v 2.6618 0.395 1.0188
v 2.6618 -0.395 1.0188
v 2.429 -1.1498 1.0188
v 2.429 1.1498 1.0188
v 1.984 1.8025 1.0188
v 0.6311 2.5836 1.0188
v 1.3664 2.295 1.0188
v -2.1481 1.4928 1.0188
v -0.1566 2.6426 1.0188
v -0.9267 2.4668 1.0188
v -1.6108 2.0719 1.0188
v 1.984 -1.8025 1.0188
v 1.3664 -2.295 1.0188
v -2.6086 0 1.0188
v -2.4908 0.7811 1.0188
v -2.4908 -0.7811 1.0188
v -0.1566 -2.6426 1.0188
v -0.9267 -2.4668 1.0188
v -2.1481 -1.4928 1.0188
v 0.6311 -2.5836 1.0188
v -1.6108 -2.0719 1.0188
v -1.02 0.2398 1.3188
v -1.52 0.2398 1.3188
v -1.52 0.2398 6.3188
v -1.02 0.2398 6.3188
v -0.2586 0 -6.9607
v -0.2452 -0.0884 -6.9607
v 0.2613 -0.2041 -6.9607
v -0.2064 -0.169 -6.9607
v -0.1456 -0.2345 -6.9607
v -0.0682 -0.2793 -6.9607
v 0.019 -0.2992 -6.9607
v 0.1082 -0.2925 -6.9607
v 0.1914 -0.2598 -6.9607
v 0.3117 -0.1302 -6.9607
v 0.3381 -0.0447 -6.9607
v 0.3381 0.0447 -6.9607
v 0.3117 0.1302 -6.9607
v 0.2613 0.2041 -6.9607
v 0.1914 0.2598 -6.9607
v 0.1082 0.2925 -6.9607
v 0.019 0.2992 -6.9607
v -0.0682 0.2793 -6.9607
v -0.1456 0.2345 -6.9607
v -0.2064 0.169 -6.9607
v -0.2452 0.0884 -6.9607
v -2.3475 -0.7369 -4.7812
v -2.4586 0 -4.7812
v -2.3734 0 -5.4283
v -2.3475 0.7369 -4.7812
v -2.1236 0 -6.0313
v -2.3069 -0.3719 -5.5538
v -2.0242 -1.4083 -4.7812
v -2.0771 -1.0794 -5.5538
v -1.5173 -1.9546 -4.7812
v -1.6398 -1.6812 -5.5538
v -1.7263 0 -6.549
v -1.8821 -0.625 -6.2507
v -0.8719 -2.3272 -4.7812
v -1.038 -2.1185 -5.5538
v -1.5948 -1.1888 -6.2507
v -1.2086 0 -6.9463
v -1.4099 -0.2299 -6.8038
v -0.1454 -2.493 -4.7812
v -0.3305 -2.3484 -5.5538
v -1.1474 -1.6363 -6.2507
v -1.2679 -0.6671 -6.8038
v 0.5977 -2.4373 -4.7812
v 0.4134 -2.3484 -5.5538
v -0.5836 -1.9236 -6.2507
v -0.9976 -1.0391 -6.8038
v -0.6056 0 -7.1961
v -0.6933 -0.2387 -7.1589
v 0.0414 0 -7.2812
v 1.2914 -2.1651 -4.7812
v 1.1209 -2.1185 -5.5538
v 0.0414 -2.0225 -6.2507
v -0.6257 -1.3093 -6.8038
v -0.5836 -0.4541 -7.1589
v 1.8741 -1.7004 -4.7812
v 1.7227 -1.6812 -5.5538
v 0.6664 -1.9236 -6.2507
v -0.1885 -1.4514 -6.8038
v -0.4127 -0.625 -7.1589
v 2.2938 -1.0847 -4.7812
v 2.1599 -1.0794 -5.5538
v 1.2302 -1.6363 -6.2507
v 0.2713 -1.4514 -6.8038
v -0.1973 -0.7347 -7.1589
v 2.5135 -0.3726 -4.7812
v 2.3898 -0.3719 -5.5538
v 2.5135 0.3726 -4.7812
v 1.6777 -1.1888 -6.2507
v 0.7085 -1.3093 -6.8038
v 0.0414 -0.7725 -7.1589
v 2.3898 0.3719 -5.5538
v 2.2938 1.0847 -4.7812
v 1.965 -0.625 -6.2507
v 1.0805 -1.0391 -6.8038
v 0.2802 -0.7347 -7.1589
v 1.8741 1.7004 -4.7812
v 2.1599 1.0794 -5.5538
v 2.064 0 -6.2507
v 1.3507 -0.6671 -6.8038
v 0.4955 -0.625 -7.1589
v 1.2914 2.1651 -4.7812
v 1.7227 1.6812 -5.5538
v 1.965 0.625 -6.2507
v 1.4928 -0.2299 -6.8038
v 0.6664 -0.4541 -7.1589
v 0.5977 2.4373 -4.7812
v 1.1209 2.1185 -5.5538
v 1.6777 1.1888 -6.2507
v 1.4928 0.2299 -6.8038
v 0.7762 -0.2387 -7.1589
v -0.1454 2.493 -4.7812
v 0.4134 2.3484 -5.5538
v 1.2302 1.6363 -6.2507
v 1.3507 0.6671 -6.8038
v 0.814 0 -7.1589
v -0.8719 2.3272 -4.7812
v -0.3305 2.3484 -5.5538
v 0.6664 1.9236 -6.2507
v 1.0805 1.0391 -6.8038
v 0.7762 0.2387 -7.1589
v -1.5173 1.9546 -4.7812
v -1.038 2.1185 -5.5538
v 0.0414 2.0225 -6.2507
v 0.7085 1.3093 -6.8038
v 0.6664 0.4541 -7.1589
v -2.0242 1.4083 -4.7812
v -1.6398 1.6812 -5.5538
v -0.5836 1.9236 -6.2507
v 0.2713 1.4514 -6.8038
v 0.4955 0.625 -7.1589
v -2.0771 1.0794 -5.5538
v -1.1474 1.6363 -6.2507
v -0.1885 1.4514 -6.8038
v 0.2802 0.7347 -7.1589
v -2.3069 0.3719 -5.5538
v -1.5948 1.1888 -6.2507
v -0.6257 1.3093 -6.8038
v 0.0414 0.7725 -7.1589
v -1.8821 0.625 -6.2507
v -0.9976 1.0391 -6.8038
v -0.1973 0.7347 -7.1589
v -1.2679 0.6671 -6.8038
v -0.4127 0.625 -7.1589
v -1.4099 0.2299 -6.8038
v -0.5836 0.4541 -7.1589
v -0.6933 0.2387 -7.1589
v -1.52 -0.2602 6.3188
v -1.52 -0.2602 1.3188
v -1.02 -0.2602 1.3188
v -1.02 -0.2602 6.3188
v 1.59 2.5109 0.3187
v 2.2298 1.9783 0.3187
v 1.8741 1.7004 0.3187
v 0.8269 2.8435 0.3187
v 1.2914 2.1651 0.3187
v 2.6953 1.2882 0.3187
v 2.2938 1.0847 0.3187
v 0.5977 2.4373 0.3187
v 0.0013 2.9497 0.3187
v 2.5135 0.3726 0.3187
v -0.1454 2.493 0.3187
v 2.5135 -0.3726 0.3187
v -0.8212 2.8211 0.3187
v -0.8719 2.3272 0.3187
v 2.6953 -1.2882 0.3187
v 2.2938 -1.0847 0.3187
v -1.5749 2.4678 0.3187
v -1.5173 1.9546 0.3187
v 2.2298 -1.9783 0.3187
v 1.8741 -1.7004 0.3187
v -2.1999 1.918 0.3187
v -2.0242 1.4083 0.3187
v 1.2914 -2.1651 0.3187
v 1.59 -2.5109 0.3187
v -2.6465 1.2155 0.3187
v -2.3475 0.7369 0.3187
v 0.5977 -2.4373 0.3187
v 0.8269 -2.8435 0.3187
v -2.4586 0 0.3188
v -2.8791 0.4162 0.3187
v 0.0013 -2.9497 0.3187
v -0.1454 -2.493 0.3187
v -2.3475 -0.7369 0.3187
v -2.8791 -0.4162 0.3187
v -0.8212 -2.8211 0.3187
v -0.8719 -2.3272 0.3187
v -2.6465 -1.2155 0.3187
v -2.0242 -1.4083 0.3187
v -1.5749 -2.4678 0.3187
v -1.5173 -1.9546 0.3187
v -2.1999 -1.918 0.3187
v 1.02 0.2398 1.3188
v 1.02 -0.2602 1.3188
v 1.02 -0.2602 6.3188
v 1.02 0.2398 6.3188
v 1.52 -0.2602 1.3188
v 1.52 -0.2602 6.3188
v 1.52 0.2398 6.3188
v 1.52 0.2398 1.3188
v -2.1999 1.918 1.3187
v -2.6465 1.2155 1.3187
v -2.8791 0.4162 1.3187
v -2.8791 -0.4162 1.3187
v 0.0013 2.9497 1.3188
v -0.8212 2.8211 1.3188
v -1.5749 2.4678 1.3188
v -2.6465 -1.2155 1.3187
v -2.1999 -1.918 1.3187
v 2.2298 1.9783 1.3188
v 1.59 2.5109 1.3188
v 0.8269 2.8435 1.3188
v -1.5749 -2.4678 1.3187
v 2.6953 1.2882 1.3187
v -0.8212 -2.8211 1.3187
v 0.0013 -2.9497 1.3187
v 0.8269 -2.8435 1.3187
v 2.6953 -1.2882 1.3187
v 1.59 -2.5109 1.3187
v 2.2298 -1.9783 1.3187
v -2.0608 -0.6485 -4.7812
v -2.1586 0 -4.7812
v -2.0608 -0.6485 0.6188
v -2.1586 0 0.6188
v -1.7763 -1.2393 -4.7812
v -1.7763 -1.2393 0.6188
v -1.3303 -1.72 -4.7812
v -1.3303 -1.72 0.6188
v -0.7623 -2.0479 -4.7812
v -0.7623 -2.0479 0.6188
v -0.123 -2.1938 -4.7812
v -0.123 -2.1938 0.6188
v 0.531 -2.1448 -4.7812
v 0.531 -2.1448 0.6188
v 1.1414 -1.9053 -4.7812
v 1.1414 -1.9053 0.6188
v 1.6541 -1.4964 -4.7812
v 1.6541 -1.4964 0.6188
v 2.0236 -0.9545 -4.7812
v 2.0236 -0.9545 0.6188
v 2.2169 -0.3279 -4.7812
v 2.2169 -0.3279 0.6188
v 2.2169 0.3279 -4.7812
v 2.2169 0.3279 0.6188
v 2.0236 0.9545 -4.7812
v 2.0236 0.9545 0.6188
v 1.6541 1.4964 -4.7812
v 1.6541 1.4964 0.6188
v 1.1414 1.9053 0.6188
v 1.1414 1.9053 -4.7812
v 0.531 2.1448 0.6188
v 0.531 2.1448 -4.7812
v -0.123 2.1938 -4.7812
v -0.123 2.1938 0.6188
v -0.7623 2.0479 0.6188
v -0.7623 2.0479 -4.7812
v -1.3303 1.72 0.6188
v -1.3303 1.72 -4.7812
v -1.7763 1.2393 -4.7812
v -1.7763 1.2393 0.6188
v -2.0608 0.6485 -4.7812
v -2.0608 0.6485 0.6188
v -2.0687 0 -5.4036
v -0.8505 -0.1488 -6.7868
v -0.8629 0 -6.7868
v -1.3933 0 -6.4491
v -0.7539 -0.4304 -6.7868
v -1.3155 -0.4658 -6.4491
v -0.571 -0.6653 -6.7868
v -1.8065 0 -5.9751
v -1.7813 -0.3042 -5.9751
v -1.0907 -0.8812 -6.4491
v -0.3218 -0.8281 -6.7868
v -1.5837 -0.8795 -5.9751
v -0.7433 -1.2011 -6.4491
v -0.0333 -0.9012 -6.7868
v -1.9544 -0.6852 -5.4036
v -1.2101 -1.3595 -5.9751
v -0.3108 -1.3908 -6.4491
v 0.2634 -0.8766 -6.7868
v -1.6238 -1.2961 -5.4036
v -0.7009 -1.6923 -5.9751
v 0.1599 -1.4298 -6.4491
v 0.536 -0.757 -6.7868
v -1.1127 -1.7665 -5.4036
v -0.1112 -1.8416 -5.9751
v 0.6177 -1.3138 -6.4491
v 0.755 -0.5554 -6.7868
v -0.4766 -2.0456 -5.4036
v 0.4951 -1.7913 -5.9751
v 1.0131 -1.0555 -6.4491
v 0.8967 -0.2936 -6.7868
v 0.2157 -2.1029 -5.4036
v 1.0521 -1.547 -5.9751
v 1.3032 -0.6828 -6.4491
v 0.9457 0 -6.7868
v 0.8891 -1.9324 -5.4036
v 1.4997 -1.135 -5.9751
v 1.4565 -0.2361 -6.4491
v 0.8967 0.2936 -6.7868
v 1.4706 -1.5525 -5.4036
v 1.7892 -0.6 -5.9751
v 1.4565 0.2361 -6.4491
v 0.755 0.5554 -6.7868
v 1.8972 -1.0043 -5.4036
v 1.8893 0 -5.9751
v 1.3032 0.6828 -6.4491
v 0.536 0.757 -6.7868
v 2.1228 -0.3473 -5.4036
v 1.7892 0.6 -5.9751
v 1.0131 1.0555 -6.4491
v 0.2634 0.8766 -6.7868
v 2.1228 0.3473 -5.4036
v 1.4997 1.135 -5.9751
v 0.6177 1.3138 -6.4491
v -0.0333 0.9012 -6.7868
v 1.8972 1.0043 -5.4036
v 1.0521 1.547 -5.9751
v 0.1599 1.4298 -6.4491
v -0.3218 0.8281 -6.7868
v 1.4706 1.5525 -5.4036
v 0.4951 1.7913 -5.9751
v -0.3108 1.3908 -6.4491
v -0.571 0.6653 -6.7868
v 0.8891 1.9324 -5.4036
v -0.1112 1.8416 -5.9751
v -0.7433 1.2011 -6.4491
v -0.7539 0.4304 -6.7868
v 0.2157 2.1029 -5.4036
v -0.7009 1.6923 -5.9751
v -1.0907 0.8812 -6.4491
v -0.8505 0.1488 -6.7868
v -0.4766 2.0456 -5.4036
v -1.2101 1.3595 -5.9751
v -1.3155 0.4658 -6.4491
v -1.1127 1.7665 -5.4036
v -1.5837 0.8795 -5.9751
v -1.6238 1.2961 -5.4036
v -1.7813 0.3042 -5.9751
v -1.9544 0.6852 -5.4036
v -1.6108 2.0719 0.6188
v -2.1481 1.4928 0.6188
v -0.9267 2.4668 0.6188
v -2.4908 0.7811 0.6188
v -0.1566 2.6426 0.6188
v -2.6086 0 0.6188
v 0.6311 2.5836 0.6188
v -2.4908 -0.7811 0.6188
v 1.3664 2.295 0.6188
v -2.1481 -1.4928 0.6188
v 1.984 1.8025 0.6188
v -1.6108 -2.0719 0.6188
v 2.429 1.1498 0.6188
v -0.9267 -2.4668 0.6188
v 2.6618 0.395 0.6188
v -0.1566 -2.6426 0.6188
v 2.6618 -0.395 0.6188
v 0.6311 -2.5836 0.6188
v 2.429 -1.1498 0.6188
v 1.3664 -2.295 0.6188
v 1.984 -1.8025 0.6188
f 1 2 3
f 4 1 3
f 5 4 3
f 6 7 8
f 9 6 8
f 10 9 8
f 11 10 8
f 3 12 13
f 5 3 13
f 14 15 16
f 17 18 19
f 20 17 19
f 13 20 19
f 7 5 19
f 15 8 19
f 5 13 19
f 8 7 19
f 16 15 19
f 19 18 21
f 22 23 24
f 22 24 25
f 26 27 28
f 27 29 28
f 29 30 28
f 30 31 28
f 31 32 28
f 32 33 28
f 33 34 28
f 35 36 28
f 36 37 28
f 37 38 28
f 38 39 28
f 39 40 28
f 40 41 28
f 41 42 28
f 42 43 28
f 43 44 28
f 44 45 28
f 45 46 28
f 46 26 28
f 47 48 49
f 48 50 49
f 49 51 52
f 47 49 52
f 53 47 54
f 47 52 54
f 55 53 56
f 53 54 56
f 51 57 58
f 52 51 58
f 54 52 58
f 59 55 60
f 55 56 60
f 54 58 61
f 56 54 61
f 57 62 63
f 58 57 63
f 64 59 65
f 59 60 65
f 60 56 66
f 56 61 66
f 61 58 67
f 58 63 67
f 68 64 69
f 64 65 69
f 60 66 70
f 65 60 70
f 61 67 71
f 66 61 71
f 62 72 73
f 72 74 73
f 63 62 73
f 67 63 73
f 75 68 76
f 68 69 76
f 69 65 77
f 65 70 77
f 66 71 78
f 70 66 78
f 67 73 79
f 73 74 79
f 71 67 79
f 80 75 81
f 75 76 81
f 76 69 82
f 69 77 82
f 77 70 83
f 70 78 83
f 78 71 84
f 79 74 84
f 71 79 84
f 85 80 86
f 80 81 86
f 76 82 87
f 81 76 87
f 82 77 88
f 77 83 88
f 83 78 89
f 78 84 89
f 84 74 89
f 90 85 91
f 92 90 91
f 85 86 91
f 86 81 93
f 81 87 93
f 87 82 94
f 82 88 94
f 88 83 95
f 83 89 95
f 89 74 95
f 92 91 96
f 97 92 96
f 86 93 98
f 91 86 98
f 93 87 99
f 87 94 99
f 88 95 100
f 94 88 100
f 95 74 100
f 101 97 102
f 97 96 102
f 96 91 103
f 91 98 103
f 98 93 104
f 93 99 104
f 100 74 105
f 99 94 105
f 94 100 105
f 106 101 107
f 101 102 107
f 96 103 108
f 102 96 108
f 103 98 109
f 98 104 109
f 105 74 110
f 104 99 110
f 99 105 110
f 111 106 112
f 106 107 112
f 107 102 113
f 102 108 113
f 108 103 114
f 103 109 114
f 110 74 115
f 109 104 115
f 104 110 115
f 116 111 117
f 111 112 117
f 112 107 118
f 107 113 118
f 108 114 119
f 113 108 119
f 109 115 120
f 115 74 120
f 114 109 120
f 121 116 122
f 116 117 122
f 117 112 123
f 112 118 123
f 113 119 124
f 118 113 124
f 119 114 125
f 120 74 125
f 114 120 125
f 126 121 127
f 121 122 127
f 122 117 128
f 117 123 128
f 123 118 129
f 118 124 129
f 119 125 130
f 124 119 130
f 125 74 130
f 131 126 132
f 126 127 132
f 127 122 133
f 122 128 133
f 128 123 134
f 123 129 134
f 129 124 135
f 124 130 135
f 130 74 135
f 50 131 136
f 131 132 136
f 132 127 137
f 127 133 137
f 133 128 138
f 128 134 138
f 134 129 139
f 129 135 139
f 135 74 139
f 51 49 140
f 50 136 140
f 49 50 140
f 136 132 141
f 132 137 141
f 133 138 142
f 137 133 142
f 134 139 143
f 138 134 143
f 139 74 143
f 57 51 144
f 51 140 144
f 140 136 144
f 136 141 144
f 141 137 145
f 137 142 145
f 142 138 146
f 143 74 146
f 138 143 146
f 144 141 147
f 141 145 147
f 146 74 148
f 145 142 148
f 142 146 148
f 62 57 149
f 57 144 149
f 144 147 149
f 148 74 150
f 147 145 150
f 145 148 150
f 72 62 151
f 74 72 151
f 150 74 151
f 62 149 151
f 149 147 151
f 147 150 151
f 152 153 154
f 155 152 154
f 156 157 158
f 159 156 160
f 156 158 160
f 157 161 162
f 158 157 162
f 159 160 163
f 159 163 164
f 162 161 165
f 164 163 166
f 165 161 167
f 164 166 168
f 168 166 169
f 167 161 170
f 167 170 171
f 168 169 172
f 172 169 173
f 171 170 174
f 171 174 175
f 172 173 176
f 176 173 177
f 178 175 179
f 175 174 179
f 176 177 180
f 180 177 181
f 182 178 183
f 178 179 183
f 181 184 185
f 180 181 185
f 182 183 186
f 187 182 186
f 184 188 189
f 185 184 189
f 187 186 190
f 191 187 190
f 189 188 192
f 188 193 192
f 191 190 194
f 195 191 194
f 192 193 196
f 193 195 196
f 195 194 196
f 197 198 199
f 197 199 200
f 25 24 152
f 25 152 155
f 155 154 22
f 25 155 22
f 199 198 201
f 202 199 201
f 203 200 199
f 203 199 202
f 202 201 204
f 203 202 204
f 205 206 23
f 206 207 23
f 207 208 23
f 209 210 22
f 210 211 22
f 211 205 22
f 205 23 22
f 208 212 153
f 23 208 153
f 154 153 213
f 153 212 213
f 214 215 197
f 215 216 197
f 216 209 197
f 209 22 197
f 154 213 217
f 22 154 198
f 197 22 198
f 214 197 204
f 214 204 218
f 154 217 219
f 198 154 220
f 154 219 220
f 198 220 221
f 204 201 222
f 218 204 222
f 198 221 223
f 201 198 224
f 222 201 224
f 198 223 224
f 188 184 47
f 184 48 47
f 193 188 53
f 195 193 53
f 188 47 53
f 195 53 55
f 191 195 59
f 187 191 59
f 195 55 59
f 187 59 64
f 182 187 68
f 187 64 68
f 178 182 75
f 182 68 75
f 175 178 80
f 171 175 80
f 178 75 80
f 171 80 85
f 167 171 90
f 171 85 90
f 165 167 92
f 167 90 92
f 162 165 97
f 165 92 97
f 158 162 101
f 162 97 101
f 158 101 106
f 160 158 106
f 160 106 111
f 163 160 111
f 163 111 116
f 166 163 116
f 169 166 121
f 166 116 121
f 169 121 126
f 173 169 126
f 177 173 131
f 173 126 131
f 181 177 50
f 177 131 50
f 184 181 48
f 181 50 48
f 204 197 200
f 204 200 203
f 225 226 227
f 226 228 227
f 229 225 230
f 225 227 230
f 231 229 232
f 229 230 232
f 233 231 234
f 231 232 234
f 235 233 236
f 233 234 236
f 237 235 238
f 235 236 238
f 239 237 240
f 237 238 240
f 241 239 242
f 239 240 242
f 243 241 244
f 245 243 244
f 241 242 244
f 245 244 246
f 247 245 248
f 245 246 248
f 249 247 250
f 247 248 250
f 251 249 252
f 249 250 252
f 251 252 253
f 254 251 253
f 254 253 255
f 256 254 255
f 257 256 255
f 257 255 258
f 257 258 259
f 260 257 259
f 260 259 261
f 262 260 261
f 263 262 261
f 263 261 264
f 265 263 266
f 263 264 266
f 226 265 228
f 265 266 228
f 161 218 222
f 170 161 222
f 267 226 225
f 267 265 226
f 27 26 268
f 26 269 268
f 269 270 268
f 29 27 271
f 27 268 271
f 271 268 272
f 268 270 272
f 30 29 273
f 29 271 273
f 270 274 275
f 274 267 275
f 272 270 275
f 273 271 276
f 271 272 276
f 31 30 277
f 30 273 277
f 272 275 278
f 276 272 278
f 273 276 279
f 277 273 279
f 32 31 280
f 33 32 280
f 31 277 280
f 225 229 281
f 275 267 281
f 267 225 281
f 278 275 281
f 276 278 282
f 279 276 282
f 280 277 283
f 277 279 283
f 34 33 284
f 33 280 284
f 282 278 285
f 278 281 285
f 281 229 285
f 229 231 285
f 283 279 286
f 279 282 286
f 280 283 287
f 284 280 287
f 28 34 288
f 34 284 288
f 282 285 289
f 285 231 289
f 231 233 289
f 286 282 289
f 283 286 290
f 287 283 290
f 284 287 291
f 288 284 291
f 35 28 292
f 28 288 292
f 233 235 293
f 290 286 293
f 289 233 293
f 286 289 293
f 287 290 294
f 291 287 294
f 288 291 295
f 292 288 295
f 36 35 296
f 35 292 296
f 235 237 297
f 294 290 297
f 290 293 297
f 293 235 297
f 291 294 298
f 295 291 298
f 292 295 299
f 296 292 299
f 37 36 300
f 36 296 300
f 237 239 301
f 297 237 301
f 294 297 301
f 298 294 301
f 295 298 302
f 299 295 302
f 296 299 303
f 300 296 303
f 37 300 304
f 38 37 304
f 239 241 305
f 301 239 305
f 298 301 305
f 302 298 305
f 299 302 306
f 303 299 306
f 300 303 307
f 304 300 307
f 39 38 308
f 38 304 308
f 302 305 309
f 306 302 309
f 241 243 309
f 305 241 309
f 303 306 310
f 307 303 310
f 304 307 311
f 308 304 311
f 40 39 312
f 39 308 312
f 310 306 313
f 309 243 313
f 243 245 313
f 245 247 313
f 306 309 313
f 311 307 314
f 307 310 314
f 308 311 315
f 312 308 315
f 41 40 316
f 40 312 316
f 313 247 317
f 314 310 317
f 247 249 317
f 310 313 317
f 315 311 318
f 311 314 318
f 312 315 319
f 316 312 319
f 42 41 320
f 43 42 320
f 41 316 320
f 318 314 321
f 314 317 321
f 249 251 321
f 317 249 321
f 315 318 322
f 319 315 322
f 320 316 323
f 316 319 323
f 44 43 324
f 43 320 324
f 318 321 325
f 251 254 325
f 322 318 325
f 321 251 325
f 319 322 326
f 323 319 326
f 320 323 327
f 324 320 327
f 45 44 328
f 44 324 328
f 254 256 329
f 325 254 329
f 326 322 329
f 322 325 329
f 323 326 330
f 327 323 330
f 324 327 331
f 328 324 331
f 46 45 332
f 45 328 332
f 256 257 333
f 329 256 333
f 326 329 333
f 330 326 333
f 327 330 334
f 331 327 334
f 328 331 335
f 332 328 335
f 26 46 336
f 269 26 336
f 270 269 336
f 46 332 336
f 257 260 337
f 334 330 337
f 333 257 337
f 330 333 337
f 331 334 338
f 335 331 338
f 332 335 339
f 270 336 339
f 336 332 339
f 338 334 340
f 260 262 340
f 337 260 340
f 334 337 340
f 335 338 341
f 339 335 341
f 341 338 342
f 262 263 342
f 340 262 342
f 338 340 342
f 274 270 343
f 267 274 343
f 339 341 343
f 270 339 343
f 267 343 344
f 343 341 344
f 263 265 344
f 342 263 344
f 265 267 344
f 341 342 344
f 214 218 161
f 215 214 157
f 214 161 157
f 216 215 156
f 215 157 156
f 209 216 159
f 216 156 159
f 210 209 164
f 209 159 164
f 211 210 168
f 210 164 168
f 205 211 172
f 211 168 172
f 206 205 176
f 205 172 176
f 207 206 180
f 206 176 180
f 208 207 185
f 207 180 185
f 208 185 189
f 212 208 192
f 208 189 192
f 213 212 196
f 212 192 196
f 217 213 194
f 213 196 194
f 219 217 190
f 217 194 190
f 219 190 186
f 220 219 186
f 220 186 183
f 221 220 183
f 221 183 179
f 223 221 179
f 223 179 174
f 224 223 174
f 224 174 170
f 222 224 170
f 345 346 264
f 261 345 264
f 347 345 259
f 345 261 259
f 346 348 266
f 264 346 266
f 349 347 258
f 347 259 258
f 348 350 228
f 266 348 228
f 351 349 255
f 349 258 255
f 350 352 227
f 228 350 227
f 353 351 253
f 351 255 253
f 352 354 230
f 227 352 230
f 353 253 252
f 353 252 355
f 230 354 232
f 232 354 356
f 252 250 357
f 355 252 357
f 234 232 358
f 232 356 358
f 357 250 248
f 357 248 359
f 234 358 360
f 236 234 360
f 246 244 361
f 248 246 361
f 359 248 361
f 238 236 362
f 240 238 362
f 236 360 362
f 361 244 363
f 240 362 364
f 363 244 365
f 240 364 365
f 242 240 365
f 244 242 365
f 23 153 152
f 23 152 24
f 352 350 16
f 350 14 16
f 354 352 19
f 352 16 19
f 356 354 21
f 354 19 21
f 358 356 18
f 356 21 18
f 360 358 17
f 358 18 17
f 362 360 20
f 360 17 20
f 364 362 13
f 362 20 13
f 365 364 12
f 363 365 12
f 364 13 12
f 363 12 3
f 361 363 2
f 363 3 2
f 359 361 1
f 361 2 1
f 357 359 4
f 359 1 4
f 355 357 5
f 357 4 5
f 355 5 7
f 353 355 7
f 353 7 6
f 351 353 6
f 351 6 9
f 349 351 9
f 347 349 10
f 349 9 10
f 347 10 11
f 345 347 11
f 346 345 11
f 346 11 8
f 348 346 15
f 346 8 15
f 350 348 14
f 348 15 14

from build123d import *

# Parameters (mm, degrees)
SKETCH2_W           = 0.5
SKETCH2_H           = 0.5
BOSS_EXTRUDE1_DEPTH = 5
CUT_EXTRUDE1_REACH  = 10.6


with BuildPart() as part:
    # Sketch1 → Revolve3 (revolve)
    with BuildSketch(Plane(origin=(0, 0, 0), x_dir=(1, 0, 0), z_dir=(0, 1, 0))):
        with BuildLine():
            Line((0.041424419, -1.31875), (-2.908575581, -1.31875))
            Line((-2.908575581, -1.31875), (-2.908575581, -0.31875))
            Line((-2.908575581, -0.31875), (-2.458575581, -0.31875))
            Line((-2.458575581, -0.31875), (-2.458575581, 4.78125))
            ThreePointArc((-2.458575581, 4.78125), (-1.726342534, 6.549016953), (0.041424419, 7.28125))
            Line((0.041424419, 7.28125), (0.041424419, 6.960699472))
            Line((0.041424419, 6.960699472), (-0.258575581, 6.960699472))
            ThreePointArc((-0.258575581, 6.960699472), (-1.616887977, 6.226933229), (-2.158575581, 4.78125))
            Line((-2.158575581, 4.78125), (-2.158575581, -0.61875))
            Line((-2.158575581, -0.61875), (-2.608575581, -0.61875))
            Line((-2.608575581, -0.61875), (-2.608575581, -1.01875))
            Line((-2.608575581, -1.01875), (-0.258575581, -1.01875))
            Line((-0.258575581, -1.01875), (0.041424419, -1.01875))
            Line((0.041424419, -1.01875), (0.041424419, -1.31875))
        make_face()
    revolve(axis=Axis((0.041424419, 0, -7.28125), (0, 0, 1)))

    # Sketch2 → Boss-Extrude1 (add)
    with BuildSketch(Plane.XY.offset(1.31875)):
        with Locations((1.27, -0.01024953)):
            Rectangle(SKETCH2_W, SKETCH2_H)
        with Locations((-1.27, -0.01024953)):
            Rectangle(SKETCH2_W, SKETCH2_H)
    extrude(amount=BOSS_EXTRUDE1_DEPTH)

    # Sketch3 → Cut-Extrude1 (cut, up to next)
    with BuildSketch(Plane(origin=(0.020061741, 0, 1.31875), x_dir=(1, 0, 0), z_dir=(0, 0, 1)), mode=Mode.PRIVATE) as cut_extrude1_sk1:
        Polygon((2.675232006, 2.192680339), (2.675232006, -2.268878516), (4.29481628, -2.502381421), (4.160489908, 2.299424082), align=None)
    cut_extrude1_tool1 = extrude(cut_extrude1_sk1.sketch, amount=-CUT_EXTRUDE1_REACH, mode=Mode.PRIVATE) & part.part
    add(cut_extrude1_tool1.solids().sort_by_distance((3.481327, -0.10236, 1.31875))[0], mode=Mode.SUBTRACT)


solid = part.part
